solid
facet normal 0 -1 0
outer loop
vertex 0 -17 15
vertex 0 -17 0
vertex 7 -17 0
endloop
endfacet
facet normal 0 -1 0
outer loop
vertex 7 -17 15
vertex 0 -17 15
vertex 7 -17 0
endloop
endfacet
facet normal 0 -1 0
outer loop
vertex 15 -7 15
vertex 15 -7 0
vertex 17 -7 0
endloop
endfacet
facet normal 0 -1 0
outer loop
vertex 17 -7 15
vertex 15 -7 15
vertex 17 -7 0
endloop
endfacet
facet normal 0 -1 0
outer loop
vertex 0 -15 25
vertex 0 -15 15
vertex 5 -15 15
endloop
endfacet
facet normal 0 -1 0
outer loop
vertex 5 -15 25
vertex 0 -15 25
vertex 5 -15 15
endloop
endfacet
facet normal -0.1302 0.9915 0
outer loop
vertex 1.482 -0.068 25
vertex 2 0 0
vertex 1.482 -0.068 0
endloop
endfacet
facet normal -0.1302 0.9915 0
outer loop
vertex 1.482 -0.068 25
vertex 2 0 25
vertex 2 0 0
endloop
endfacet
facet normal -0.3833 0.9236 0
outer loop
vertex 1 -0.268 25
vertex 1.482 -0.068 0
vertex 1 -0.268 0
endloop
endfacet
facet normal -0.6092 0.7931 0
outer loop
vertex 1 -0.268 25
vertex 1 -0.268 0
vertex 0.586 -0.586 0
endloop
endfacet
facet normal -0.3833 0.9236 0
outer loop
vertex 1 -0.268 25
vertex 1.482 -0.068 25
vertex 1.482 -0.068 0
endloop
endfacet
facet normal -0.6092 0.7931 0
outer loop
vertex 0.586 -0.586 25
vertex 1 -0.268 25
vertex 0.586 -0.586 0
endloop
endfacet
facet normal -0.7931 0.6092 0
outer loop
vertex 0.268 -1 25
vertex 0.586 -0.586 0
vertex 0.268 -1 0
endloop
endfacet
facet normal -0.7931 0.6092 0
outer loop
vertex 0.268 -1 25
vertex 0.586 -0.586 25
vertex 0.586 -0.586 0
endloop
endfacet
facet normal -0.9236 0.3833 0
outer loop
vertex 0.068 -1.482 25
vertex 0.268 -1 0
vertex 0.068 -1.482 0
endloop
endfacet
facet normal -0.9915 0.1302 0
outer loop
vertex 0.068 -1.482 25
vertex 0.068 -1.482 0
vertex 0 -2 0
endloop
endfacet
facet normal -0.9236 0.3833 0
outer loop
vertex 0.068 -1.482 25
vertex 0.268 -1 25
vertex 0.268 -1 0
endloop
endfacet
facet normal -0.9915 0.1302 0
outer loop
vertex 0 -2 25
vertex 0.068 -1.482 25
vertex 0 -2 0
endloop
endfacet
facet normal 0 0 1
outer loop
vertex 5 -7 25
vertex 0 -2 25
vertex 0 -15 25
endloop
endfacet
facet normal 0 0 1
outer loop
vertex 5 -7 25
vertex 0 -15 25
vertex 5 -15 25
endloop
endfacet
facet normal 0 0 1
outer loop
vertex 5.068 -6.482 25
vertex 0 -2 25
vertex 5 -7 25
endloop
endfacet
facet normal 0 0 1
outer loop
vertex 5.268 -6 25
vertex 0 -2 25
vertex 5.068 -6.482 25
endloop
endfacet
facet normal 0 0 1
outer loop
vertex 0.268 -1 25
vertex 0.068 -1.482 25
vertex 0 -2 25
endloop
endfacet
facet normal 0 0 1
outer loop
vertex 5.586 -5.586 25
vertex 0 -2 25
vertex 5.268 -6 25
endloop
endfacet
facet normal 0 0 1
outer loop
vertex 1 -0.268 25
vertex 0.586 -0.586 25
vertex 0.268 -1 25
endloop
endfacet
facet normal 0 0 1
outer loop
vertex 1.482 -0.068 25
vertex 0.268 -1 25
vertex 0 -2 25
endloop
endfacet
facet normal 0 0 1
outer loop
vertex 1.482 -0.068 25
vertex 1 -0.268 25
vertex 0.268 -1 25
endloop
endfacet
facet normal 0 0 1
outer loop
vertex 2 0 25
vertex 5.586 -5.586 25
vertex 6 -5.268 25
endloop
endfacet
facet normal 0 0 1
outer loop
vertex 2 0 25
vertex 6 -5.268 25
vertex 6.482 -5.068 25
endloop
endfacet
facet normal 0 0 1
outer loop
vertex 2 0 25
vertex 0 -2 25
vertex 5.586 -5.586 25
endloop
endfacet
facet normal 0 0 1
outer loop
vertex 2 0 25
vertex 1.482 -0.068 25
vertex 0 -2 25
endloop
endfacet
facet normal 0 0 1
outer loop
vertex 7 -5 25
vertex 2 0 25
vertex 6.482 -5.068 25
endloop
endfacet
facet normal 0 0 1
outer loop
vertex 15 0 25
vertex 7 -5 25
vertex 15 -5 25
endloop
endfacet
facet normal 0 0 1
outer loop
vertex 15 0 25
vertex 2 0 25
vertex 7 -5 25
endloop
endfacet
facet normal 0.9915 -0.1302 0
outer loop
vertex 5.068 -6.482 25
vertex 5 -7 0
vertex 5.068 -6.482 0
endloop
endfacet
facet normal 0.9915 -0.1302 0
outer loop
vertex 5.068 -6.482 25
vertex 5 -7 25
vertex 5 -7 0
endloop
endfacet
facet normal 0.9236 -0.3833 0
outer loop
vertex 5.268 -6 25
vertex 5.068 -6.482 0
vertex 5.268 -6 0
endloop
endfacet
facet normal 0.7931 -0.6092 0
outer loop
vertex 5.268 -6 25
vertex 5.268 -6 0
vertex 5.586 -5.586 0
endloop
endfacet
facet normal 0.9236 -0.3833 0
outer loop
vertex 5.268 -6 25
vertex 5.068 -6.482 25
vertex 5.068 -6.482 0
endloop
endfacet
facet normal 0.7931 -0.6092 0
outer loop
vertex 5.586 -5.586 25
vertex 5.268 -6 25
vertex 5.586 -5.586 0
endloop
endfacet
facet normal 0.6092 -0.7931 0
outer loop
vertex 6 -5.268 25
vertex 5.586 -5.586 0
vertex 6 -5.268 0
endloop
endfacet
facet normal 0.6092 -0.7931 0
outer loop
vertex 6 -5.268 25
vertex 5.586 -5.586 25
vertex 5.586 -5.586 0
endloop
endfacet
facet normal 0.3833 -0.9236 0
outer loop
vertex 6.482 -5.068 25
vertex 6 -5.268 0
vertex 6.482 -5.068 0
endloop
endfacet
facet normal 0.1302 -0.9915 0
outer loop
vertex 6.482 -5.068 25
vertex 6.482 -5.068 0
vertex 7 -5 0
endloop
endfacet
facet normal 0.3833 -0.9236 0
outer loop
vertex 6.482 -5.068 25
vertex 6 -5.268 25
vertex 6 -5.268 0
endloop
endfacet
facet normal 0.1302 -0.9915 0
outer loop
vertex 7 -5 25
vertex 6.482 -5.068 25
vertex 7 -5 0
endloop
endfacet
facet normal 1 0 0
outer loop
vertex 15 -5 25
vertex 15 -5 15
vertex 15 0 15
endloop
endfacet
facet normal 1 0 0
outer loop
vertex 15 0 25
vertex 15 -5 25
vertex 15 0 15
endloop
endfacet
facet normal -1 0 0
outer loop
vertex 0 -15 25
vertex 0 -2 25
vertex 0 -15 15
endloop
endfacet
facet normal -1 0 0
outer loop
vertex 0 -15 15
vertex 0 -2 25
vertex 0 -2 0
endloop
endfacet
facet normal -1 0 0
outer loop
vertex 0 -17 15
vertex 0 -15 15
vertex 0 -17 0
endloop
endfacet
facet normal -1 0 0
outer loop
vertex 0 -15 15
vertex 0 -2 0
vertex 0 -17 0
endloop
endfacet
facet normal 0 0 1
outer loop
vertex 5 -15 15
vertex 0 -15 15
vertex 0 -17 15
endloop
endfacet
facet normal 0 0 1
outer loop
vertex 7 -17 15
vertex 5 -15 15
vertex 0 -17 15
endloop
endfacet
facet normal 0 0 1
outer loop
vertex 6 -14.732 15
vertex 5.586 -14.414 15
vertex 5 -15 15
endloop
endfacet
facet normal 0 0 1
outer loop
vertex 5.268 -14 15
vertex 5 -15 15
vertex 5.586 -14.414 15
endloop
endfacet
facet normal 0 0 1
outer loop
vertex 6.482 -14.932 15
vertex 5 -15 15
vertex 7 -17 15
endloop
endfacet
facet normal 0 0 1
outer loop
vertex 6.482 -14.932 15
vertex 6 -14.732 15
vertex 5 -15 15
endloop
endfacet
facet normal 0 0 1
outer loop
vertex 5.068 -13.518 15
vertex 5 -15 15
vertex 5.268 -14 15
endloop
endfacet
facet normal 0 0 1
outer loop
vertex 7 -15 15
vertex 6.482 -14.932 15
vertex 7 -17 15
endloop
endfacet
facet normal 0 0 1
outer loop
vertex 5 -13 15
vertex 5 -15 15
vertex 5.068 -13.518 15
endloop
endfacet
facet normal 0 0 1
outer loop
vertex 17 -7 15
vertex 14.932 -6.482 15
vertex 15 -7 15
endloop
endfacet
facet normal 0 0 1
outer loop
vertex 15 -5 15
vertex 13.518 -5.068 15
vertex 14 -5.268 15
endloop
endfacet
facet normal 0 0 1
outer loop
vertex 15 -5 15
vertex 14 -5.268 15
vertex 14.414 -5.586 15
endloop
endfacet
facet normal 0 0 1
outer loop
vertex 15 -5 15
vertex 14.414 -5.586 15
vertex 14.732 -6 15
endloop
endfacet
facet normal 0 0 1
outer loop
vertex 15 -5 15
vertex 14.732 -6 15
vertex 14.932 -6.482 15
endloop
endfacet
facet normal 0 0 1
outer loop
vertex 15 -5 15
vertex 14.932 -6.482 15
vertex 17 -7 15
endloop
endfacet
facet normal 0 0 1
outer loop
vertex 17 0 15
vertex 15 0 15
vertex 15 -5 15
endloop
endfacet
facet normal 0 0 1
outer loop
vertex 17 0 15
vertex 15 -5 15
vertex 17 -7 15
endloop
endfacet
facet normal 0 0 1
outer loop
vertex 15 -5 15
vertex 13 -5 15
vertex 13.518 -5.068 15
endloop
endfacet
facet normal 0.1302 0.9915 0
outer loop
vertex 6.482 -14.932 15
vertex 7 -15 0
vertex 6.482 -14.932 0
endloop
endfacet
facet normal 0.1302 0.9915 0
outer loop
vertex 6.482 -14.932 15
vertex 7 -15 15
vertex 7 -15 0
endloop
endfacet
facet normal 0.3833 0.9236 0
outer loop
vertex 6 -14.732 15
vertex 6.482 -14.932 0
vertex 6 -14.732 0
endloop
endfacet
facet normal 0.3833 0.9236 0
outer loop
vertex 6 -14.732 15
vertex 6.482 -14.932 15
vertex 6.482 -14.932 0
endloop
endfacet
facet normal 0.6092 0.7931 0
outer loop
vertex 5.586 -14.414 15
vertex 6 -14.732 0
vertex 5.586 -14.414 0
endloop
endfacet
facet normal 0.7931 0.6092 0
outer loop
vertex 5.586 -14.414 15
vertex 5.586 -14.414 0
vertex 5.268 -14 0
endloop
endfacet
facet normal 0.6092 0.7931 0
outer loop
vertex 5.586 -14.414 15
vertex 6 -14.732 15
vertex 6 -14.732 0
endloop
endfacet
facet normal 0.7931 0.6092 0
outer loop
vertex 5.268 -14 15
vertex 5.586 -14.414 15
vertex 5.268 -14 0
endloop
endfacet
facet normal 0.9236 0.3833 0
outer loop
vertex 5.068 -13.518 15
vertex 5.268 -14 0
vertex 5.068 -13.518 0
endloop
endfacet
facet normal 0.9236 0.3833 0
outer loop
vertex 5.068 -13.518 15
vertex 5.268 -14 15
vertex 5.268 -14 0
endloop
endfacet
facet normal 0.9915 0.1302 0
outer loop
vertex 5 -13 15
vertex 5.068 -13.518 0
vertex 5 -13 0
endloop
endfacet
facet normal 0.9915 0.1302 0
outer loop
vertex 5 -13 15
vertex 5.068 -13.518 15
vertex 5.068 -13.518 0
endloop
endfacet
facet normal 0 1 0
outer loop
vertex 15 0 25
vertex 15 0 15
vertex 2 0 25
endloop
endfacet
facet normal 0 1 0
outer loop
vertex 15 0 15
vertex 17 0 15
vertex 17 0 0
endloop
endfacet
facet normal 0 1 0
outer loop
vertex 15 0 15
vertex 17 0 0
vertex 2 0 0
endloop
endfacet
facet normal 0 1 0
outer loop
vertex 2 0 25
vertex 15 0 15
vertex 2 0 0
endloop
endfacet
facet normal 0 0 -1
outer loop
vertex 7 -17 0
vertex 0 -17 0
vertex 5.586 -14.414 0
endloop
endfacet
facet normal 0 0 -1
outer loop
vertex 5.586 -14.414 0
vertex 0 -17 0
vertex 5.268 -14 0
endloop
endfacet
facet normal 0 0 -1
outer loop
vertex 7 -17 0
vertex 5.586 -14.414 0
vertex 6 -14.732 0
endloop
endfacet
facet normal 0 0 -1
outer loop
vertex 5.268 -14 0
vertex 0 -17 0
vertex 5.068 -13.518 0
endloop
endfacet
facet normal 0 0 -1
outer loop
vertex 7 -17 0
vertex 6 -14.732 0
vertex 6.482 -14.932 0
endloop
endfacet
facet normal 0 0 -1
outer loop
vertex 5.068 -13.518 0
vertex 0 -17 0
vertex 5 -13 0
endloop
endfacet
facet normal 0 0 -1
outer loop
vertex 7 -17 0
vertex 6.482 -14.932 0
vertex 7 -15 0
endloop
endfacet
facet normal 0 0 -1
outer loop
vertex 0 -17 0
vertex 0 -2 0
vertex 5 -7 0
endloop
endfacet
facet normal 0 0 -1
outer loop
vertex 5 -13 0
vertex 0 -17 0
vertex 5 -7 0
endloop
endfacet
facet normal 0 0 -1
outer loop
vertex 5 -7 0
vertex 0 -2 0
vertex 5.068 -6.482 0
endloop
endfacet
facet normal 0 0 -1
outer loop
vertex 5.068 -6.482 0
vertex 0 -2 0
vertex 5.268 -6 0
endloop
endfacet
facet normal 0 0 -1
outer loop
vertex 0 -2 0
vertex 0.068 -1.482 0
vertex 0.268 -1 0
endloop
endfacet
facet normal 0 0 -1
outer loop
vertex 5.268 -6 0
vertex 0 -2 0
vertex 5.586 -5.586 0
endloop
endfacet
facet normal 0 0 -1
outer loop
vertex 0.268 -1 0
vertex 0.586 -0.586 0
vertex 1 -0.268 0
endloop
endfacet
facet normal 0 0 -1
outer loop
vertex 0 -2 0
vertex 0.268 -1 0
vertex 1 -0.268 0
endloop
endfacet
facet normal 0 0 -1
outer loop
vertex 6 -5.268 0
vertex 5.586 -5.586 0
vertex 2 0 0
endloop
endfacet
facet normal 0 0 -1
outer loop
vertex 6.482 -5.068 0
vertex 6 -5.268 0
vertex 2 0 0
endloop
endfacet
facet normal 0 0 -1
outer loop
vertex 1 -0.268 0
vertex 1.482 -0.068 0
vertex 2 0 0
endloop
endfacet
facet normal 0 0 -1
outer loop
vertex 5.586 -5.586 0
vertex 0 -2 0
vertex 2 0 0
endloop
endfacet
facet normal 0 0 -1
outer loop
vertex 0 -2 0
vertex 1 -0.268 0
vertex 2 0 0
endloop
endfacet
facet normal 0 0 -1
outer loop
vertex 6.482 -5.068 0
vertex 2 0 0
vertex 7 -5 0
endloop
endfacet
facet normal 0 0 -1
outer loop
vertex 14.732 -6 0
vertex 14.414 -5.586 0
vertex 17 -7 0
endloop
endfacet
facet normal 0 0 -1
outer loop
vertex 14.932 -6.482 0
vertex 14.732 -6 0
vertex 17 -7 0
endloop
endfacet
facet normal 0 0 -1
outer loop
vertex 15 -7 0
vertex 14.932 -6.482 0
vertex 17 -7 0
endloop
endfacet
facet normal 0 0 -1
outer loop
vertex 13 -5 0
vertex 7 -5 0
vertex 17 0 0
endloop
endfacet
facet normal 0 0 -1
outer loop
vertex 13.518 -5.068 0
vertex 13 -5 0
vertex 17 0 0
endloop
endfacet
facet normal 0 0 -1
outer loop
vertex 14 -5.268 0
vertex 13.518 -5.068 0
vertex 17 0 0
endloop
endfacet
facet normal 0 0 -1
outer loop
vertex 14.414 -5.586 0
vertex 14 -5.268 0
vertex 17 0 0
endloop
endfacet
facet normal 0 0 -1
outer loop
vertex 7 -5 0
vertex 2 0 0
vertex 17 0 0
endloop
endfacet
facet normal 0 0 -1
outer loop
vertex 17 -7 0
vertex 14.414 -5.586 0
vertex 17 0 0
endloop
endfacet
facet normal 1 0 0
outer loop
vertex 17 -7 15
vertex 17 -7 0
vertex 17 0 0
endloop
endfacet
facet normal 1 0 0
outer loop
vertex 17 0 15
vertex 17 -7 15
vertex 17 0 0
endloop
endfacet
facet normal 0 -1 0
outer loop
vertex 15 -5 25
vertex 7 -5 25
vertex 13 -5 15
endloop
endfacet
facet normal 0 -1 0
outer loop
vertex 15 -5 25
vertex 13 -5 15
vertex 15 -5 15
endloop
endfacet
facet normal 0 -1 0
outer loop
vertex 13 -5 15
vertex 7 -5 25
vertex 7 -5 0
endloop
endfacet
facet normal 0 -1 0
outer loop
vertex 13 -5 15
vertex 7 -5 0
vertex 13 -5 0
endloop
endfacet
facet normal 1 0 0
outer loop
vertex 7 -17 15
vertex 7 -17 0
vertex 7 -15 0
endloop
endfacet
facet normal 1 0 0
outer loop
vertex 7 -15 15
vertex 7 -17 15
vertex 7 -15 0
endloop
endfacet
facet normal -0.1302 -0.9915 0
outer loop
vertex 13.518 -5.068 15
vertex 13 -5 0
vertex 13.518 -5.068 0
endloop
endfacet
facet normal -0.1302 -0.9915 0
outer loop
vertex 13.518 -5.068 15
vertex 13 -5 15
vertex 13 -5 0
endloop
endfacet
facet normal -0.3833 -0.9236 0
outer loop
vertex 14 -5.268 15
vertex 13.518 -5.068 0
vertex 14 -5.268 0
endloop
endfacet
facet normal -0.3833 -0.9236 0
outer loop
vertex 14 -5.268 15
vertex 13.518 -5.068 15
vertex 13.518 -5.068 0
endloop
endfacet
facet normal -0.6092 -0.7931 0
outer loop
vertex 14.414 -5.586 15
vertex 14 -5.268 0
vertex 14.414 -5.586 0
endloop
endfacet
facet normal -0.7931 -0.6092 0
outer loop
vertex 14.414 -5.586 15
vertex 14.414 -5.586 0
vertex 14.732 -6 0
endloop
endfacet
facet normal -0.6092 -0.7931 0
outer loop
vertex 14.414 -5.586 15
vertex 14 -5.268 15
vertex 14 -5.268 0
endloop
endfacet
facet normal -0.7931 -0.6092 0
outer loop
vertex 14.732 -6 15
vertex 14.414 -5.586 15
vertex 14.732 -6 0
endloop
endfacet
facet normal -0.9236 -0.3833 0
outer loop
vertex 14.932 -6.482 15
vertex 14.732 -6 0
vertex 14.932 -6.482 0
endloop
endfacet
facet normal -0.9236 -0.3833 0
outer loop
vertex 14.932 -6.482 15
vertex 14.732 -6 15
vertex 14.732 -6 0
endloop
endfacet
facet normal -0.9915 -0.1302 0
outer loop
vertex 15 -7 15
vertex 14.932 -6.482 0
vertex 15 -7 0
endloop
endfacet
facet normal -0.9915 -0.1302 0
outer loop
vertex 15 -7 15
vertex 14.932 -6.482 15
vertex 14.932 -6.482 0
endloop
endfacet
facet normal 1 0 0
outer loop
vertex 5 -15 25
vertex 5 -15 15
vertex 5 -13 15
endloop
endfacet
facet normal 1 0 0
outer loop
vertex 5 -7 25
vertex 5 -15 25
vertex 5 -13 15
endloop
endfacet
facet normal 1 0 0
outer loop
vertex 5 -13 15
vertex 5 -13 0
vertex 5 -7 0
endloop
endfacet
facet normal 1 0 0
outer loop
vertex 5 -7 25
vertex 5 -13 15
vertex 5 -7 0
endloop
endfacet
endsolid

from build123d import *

# Parameters (mm, degrees)
F1_DEPTH = 25
F2_R     = 2
F3_DEPTH = 15
F4_R     = 1.99999


# Not quite as in the source:
# - a fillet or chamfer is up to 0.001 mm smaller than in the source, because OpenCascade refuses the exact size


with BuildPart() as f1:
    # F0 (on Top) → F1 (new body)
    with BuildSketch(Plane.XY):
        Polygon((15, 0), (0, 0), (0, -15), (5, -15), (5, -5), (15, -5), align=None)
    extrude(amount=F1_DEPTH)

    # F2
    f2_edges = [f1.edges().sort_by_distance(p)[0] for p in [
        (5, -5, 12.5),
        (0, 0, 12.5),
    ]]
    fillet(f2_edges, radius=F2_R)

    # F0 (on Top) → F3 (join)
    with BuildSketch(Plane.XY):
        Polygon((5, -15), (0, -15), (0, -17), (7, -17), (7, -15), align=None)
        Polygon((17, 0), (15, 0), (15, -5), (15, -7), (17, -7), align=None)
    extrude(amount=F3_DEPTH)

    # F4 (radius 2 in the source; OpenCascade refuses exactly that, so slightly less here)
    f4_edges = [f1.edges().sort_by_distance(p)[0] for p in [
        (5, -15, 7.5),
        (15, -5, 7.5),
    ]]
    fillet(f4_edges, radius=F4_R)


solid = f1.part
